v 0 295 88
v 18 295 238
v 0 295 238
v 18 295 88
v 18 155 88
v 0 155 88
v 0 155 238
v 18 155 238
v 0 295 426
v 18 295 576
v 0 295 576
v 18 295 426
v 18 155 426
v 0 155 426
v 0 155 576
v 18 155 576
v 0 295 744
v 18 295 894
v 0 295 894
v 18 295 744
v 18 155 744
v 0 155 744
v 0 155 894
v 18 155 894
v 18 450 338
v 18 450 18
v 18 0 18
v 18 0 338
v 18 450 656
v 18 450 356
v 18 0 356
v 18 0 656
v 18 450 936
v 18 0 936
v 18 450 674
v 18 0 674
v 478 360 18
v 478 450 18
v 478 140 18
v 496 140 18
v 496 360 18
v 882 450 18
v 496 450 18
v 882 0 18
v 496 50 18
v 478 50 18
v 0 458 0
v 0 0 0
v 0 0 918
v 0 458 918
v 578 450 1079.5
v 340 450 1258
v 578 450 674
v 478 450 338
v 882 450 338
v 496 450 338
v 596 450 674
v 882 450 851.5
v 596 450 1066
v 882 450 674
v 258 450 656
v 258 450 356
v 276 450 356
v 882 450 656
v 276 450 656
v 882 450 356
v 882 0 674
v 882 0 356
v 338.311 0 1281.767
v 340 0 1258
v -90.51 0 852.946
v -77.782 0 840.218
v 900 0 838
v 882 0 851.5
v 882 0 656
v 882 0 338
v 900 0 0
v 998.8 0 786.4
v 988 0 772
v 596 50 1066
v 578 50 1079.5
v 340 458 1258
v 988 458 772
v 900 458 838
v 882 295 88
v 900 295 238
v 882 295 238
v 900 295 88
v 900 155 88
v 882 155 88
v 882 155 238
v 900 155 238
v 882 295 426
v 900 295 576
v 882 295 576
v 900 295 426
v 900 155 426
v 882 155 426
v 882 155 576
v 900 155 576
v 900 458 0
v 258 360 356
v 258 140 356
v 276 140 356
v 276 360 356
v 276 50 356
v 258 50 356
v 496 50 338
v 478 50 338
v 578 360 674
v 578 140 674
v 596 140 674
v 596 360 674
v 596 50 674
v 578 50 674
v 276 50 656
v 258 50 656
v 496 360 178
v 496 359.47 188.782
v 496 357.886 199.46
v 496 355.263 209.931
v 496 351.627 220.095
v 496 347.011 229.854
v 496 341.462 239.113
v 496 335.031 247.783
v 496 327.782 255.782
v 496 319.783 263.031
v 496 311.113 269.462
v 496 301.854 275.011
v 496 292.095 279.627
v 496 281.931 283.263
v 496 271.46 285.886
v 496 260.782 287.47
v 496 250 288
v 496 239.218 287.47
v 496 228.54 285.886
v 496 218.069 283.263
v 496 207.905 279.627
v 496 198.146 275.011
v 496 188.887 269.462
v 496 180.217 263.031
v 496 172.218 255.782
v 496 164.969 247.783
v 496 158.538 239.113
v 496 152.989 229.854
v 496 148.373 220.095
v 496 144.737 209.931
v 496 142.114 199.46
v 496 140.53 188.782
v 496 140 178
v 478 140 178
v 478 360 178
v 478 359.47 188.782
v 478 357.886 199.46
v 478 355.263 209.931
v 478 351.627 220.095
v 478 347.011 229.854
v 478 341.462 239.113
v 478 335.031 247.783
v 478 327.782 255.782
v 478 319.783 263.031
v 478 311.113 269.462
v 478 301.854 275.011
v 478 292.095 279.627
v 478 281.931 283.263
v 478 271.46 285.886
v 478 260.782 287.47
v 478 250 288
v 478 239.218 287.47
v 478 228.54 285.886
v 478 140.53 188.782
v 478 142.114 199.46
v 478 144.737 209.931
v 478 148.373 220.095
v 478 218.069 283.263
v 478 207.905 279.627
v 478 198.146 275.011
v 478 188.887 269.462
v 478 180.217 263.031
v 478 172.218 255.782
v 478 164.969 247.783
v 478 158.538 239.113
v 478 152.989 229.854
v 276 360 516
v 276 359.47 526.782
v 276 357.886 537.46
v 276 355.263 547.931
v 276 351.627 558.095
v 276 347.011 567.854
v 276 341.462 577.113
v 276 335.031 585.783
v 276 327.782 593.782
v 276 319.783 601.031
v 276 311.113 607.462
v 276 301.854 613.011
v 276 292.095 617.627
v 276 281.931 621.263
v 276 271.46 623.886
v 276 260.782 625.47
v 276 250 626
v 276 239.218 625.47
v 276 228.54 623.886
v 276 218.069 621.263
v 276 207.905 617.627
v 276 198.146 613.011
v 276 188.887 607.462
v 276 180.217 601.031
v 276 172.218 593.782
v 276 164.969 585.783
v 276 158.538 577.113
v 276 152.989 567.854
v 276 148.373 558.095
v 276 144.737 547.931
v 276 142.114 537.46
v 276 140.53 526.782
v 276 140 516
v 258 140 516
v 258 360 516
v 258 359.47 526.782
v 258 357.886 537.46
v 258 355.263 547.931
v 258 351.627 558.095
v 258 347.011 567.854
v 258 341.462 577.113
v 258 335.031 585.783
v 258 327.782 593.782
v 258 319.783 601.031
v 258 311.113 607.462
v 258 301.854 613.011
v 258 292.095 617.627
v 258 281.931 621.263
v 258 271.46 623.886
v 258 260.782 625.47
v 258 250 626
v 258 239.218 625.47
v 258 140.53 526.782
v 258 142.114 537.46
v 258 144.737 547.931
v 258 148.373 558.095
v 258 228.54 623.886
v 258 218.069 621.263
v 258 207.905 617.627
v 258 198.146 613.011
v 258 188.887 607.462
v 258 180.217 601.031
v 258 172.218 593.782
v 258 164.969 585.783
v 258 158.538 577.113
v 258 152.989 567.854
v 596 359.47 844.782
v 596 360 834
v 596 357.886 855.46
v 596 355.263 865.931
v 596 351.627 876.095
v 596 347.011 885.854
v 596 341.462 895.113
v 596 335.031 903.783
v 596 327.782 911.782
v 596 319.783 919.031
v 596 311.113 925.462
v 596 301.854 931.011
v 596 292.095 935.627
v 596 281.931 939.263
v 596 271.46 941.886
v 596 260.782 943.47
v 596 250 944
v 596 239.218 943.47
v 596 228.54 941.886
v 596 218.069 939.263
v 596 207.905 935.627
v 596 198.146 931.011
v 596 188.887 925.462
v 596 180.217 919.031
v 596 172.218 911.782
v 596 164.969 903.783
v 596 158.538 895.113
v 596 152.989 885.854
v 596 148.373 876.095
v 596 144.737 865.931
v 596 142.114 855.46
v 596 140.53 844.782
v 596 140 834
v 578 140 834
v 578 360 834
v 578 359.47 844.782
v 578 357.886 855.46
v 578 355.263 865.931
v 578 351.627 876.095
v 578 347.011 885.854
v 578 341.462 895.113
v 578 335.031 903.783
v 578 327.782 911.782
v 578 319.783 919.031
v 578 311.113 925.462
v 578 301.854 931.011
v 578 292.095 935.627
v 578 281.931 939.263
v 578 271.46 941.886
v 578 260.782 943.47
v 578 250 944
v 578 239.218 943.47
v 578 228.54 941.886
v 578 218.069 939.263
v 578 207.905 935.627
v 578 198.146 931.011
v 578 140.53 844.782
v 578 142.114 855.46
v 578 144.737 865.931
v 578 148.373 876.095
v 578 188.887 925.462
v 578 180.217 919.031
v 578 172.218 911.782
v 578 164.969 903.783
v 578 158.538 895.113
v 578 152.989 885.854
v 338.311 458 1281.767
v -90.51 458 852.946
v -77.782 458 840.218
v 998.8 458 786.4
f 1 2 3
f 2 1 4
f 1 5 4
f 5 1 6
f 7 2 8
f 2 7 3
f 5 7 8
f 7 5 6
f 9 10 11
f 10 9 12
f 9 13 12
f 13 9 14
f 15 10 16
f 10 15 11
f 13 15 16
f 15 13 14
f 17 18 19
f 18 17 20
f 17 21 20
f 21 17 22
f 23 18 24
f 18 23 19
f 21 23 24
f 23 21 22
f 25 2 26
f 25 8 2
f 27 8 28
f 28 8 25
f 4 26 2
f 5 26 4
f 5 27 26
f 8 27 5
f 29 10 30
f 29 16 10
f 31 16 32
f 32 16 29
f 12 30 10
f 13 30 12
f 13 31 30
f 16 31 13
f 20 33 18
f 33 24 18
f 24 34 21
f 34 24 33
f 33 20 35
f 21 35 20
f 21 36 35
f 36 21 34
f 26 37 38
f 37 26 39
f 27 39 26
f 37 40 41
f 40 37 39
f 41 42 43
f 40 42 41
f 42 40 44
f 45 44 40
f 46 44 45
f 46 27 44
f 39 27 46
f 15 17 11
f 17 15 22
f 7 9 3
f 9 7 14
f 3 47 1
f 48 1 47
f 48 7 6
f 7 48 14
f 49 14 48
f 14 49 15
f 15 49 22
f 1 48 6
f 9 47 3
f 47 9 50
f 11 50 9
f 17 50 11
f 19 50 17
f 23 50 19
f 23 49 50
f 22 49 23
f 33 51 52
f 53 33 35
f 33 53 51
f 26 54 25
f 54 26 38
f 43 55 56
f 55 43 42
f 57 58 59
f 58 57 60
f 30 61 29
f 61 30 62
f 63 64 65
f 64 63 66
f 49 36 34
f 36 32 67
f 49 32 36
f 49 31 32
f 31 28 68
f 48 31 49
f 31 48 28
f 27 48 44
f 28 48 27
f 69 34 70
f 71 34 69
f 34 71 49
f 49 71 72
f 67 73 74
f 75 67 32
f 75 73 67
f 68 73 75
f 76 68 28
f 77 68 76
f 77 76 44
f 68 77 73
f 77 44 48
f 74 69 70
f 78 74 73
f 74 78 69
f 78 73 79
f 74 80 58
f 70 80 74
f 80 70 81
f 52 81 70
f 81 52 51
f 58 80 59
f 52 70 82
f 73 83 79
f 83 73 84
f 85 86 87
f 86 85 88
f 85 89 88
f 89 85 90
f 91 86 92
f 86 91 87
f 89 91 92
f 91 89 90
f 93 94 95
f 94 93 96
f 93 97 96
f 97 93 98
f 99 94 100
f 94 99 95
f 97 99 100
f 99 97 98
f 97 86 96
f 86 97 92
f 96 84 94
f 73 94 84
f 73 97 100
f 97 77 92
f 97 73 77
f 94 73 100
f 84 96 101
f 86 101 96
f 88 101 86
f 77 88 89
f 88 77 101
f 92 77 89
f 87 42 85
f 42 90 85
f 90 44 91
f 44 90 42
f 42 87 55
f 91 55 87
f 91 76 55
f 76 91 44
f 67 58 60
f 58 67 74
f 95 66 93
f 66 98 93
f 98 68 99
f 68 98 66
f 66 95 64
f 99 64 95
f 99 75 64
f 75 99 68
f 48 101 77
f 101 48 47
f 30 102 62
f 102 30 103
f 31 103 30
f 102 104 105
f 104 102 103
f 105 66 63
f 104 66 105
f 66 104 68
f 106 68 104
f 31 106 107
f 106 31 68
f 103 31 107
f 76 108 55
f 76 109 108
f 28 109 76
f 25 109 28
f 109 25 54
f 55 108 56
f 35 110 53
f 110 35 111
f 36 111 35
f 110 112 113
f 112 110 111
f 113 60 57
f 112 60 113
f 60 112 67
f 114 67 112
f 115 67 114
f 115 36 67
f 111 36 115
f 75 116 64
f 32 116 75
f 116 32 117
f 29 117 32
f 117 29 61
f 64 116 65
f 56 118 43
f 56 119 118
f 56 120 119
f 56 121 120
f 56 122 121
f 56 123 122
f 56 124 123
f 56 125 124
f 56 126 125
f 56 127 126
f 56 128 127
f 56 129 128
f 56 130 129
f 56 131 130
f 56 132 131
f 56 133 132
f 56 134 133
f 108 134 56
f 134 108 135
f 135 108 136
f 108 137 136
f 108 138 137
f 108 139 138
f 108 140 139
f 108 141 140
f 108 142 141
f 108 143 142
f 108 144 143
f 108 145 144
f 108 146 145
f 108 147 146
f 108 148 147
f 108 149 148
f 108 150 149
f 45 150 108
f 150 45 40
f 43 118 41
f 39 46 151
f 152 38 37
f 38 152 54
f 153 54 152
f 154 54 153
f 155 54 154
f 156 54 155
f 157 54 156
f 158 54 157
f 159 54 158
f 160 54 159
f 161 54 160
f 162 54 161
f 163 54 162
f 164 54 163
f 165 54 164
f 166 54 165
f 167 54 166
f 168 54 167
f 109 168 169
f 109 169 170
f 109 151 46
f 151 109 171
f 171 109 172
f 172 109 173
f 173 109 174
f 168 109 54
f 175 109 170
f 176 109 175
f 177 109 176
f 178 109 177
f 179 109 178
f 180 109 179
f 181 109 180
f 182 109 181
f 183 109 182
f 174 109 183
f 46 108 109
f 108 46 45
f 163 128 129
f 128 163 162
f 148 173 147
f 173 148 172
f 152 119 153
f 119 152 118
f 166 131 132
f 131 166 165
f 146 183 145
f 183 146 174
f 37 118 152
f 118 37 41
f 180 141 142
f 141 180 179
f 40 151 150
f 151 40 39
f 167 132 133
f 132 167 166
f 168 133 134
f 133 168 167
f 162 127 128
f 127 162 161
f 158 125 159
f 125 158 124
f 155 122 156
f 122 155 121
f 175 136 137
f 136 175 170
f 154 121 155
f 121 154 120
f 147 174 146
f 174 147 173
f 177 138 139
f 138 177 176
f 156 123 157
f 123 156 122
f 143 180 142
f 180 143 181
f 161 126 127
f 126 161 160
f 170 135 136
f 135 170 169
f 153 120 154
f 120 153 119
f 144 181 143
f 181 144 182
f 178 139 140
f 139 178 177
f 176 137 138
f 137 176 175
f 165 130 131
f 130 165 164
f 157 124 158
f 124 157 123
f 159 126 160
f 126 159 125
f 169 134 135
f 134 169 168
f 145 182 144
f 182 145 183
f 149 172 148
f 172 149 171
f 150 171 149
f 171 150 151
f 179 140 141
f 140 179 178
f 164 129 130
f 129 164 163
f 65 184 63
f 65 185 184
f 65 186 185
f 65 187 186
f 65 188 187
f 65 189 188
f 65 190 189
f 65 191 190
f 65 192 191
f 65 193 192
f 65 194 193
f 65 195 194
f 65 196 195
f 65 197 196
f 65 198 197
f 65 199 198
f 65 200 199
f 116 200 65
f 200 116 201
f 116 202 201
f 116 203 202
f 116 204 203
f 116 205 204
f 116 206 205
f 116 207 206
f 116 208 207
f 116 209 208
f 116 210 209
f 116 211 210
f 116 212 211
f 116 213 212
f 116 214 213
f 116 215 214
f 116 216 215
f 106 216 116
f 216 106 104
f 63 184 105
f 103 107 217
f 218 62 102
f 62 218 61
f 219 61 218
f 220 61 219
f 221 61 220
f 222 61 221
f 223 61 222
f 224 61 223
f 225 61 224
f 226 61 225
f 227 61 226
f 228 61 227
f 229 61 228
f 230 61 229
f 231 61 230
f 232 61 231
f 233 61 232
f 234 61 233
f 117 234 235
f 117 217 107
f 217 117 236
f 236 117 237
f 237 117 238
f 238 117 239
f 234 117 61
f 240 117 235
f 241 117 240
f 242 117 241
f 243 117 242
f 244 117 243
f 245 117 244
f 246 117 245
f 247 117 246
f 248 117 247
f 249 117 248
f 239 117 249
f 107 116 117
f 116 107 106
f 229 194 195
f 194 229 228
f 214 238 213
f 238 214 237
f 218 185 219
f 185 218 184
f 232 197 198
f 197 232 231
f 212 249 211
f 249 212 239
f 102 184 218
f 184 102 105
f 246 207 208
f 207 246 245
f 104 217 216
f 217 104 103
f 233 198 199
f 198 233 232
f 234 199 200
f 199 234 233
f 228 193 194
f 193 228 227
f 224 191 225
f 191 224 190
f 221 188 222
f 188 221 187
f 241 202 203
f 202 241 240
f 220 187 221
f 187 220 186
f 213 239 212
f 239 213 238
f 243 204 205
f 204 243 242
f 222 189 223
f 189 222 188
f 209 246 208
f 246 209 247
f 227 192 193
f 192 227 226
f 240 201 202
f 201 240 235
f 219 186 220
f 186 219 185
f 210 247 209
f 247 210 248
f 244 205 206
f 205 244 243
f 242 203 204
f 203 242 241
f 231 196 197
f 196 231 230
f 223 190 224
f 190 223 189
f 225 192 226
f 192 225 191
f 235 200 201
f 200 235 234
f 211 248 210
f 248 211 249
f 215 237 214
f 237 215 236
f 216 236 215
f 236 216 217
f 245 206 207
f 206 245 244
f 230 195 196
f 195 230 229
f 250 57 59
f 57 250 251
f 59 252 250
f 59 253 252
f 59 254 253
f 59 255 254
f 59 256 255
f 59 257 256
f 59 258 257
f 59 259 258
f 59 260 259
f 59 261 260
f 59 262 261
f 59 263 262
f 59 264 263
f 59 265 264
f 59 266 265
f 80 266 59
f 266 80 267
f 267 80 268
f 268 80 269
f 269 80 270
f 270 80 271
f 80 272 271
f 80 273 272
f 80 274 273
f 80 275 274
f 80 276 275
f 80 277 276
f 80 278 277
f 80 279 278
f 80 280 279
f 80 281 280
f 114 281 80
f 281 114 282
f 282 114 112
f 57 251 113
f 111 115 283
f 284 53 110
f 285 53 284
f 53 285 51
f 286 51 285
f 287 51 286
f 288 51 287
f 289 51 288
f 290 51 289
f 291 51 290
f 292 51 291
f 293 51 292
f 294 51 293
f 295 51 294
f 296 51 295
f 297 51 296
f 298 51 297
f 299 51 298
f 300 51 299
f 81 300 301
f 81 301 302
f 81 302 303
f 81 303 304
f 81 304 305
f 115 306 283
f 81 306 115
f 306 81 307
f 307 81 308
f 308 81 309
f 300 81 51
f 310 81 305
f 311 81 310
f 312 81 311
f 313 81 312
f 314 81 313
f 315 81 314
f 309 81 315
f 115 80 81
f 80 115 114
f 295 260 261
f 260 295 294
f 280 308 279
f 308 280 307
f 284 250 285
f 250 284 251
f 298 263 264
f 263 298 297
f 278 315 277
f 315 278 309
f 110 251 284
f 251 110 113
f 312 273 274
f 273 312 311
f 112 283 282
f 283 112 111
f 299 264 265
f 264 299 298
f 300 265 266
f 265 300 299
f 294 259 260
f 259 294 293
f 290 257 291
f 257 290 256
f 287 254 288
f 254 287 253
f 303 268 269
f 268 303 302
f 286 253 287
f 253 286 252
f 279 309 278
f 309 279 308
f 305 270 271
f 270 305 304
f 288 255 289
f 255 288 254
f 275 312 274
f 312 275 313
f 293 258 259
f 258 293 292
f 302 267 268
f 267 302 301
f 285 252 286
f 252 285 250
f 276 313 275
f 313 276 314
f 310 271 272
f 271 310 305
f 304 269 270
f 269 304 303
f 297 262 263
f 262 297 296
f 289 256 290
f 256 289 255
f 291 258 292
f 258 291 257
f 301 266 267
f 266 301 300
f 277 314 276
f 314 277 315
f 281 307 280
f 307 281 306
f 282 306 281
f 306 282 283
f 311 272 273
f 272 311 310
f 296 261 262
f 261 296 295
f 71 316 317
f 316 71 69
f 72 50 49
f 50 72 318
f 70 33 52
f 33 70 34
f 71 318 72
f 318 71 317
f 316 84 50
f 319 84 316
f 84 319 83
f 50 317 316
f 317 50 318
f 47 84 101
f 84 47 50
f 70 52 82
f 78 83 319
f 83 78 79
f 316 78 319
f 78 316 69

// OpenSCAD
// A dollhouse at 1:12, the same editing loop as bracket.scad and three orders
// of magnitude bigger: a metre of house in millimetres, cut from sheet stock.
//
// It is here for the size. A bracket fits in the preview whatever you do to it;
// this one has to be framed, and every number is load-bearing — move the ridge
// and two roof panels, a mitre and an attic wall all follow.
//
// Sheet goods, so the model is built the way it would be cut:
//   - carcass of 18 mm birch ply
//   - 8 mm back panel, screwed on behind, no groove to rout
//   - roof mitred at the ridge, flush over the back panel
//   - windows in the side walls, arched doorways in the partitions
//
// X = width, Y = depth, Z = height. Origin at the front left corner of the
// base. Everything in millimetres.

/* [Stock] */
t          = 18;        // carcass ply
back_t     = 8;         // back panel

/* [Outside] */
W          = 900;       // outside width
D          = 450;       // carcass depth, back panel not counted
wall_l_h   = 900;       // left side wall, above the base
wall_r_h   = 820;       // right side wall — deliberately the shorter one

/* [Storeys] */
h_ground   = 320;       // clear height, ground floor
h_first    = 300;       // clear height, first floor

/* [Roof] */
// The ridge is not a given number: pick where it sits and how steep the left
// side is, and the right pitch is whatever reaches the lower wall.
ridge_x    = 340;       // ridge position, measured from the left
pitch_l    = 45;        // pitch of the left roof, degrees
overhang   = 110;       // eaves overhang, measured along the slope
back_over  = 0;         // extra roof behind the back panel

/* [Partitions] */
div_depth  = 400;       // depth of the upright partitions
room_g_l   = 460;       // clear room width, ground floor left
room_f_l   = 240;       // clear room width, first floor left
room_a_l   = 560;       // clear room width, attic left

/* [Doorways] */
arch_w     = 220;       // width, in Y
arch_h     = 270;       // total height including the round top

/* [Windows] */
win_w      = 140;       // width, in Y — across the depth of the house
win_h      = 150;       // height
win_sill   = 70;        // sill above the floor it stands on
win_arched = false;     // true = round top, to match the doorways
win_ground = true;
win_first  = true;
win_attic  = true;      // left always; right only if that wall is tall enough

/* [View] */
explode    = 0;         // 0 = assembled, 150 = exploded
show_back  = true;
show_roof  = true;

$fn = 64;

// =====================================================================
// Derived
// =====================================================================

w_in   = W - 2*t;           // clear inside width
x_in   = t;                 // inside face of the left wall

z_base   = 0;               // base, full width
z_ground = t;               // top of the base = ground floor
z_d2     = z_ground + h_ground;
z_first  = z_d2 + t;
z_d3     = z_first + h_first;
z_attic  = z_d3 + t;

top_l  = t + wall_l_h;      // top edge of the left wall
top_r  = t + wall_r_h;      // top edge of the right wall

roof_depth = D + back_t + back_over;   // the roof covers the back panel too

// --- Pitches. The left one is given; the right one falls out of it. ---
ridge_z = top_l + ridge_x * tan(pitch_l);

dx_l    = ridge_x;
dz_l    = ridge_z - top_l;
len_l   = sqrt(dx_l*dx_l + dz_l*dz_l);

dx_r    = W - ridge_x;
dz_r    = ridge_z - top_r;
pitch_r = atan2(dz_r, dx_r);
len_r   = sqrt(dx_r*dx_r + dz_r*dz_r);

panel_l = len_l + overhang;   // small panel, left, on the underside
panel_r = len_r + overhang;   // large panel, right

angle_ridge   = 180 - pitch_l - pitch_r;
angle_eaves_l = 90 + pitch_l;
angle_eaves_r = 90 + pitch_r;

// --- Mitre plane at the ridge: the bisector of the two roof planes ---
bx_  = cos(pitch_r) - cos(pitch_l);
bz_  = -(sin(pitch_l) + sin(pitch_r));
bl_  = sqrt(bx_*bx_ + bz_*bz_);
bxn  = bx_ / bl_;
bzn  = bz_ / bl_;
mitre = atan2(-bxn, -bzn);          // tilt of the mitre plane off vertical
blade = 90 - angle_ridge/2;         // blade tilt to set on the saw

// Normal of the mitre plane, pointing towards +x
nx_ = -bzn;
nz_ =  bxn;

// Where a line crosses the mitre plane, parameter s from (ex, ez)
function s_ridge(ex, ez, dx, dz) =
    ((ridge_x - ex)*nx_ + (ridge_z - ez)*nz_) / (dx*nx_ + dz*nz_);

// Eaves corners of the undersides
ex_l = ridge_x - cos(pitch_l)*panel_l;
ez_l = ridge_z - sin(pitch_l)*panel_l;
ex_r = ridge_x + cos(pitch_r)*panel_r;
ez_r = ridge_z - sin(pitch_r)*panel_r;

// Cut length = the longer of the two edges once the mitre is taken off
sl_low = s_ridge(ex_l, ez_l, cos(pitch_l), sin(pitch_l));
sl_up  = s_ridge(ex_l - t*sin(pitch_l), ez_l + t*cos(pitch_l), cos(pitch_l), sin(pitch_l));
sr_low = s_ridge(ex_r, ez_r, -cos(pitch_r), sin(pitch_r));
sr_up  = s_ridge(ex_r + t*sin(pitch_r), ez_r + t*cos(pitch_r), -cos(pitch_r), sin(pitch_r));

cut_l = max(sl_low, sl_up);
cut_r = max(sr_low, sr_up);

// Outside height over the ridge
ridge_outside = ridge_z + t / cos((pitch_l + pitch_r)/2);

// Room widths on the other side of each partition
room_g_r = w_in - room_g_l - t;
room_f_r = w_in - room_f_l - t;
room_a_r = w_in - room_a_l - t;

x_div_a = x_in + room_a_l;

// Underside of the roof at x
function roof_z(x) = (x <= ridge_x)
    ? top_l + x * tan(pitch_l)
    : top_r + (W - x) * tan(pitch_r);

div_h_a   = roof_z(x_div_a) - z_attic;
div_h_a_r = roof_z(x_div_a + t) - z_attic;   // other face, the roof has moved

win_top = win_sill + win_h;

// Does a window still fit under the low right wall in the attic?
// (20 mm of material over the head is the least worth cutting.)
attic_r_fits = (z_attic + win_top) <= (top_r - 20);

// =====================================================================
// Parts
// =====================================================================

module base_floor()  cube([W, D, t]);
module inner_floor() cube([w_in, D, t]);

// Everything above the two roof planes — used to take the tops off walls
module above_roof() {
    translate([ridge_x, -10, ridge_z]) {
        rotate([0, -pitch_l, 0]) translate([-3000, 0, 0]) cube([3000, roof_depth + 20, 3000]);
        rotate([0,  pitch_r, 0])                          cube([3000, roof_depth + 20, 3000]);
    }
}

// A window, cut through the full thickness of a side wall
module window_cut(z_floor) {
    r  = win_w / 2;
    y0 = (D - win_w) / 2;
    z0 = z_floor + win_sill;
    translate([t + 1, y0, z0])
        rotate([0, -90, 0])
            linear_extrude(t + 2)
                if (win_arched)
                    union() {
                        square([win_h - r, win_w]);
                        translate([win_h - r, r]) circle(r);
                    }
                else
                    square([win_h, win_w]);
}

module side_wall(x, is_left) {
    difference() {
        translate([x, 0, t]) cube([t, D, ridge_z - t]);
        above_roof();
        translate([x, 0, 0]) {
            if (win_ground) window_cut(z_ground);
            if (win_first)  window_cut(z_first);
            if (win_attic && (is_left || attic_r_fits)) window_cut(z_attic);
        }
    }
}

// The doorway, as a negative
module archway(z0) {
    r  = arch_w / 2;
    y0 = (D - div_depth) + (div_depth - arch_w) / 2;
    translate([t + 1, y0, z0])
        rotate([0, -90, 0])
            linear_extrude(t + 2)
                union() {
                    square([arch_h - r, arch_w]);
                    translate([arch_h - r, r]) circle(r);
                }
}

// to_roof = true: the top is taken off by the roof, as in the attic.
// Otherwise the part stops dead under the floor above.
module divider(x, z0, h, arched = true, to_roof = false) {
    difference() {
        translate([x, D - div_depth, z0])
            cube([t, div_depth, to_roof ? h + 60 : h]);
        if (arched)  translate([x, 0, 0]) archway(z0);
        if (to_roof) above_roof();
    }
}

// The two half-spaces either side of the mitre plane
module past_ridge_right() {
    translate([ridge_x, -10, ridge_z]) rotate([0, mitre, 0])
        translate([0, 0, -3000]) cube([3000, roof_depth + 20, 6000]);
}
module past_ridge_left() {
    translate([ridge_x, -10, ridge_z]) rotate([0, mitre, 0])
        translate([-3000, 0, -3000]) cube([3000, roof_depth + 20, 6000]);
}

module roof_left() {
    difference() {
        translate([ridge_x, 0, ridge_z]) rotate([0, -pitch_l, 0])
            translate([-panel_l, 0, 0]) cube([panel_l + 60, roof_depth, t]);
        past_ridge_right();
    }
}

module roof_right() {
    difference() {
        translate([ridge_x, 0, ridge_z]) rotate([0, pitch_r, 0])
            translate([-60, 0, 0]) cube([panel_r + 60, roof_depth, t]);
        past_ridge_left();
    }
}

module back_panel() {
    translate([0, D + back_t, 0]) rotate([90, 0, 0])
        linear_extrude(back_t)
            polygon([[0, 0], [W, 0], [W, top_r], [ridge_x, ridge_z], [0, top_l]]);
}

// =====================================================================
// Assembly
// =====================================================================

module dollhouse() {
    color("BurlyWood") {
        translate([0, 0, z_base])              base_floor();
        translate([x_in, 0, z_d2 + explode])   inner_floor();
        translate([x_in, 0, z_d3 + 2*explode]) inner_floor();

        translate([-explode, 0, 0]) side_wall(0,     true);
        translate([ explode, 0, 0]) side_wall(W - t, false);
    }

    color("Tan") {
        divider(x_in + room_g_l, z_ground, h_ground);
        translate([0, 0, explode])   divider(x_in + room_f_l, z_first, h_first);
        translate([0, 0, 2*explode]) divider(x_div_a, z_attic, div_h_a, true, true);
    }

    if (show_roof)
        color("Sienna") translate([0, 0, 3*explode]) {
            roof_left();
            roof_right();
        }

    if (show_back)
        color("Peru", 0.85) translate([0, explode, 0]) back_panel();
}

dollhouse();

// =====================================================================
// Cut list, in the console
// =====================================================================

echo();
echo("=============== DOLLHOUSE — CUT LIST ===============");
echo(str("stock, carcass / back    : ", t, " / ", back_t, " mm"));
echo(str("outside, W x D           : ", W, " x ", D + back_t, " mm"));
echo(str("ridge, inside / outside  : ", ridge_z, " / ", ridge_outside, " mm"));
echo(str("clear inside width       : ", w_in, " mm"));
echo();
echo("--- floors ---");
echo(str("base, full width         : ", W, " x ", D, " mm"));
echo(str("two inner floors         : ", w_in, " x ", D, " mm  <-- not the full ", W));
echo();
echo("--- side walls ---");
echo(str("left                     : ", wall_l_h, " x ", D, " mm, top at z = ", top_l));
echo(str("right                    : ", wall_r_h, " x ", D, " mm, top at z = ", top_r));
echo();
echo(str("--- partitions, ", div_depth, " mm deep ---"));
echo(str("ground : ", h_ground, " mm  at x = ", x_in + room_g_l));
echo(str("first  : ", h_first,  " mm  at x = ", x_in + room_f_l));
echo(str("attic  : ", div_h_a, " mm left / ", div_h_a_r, " mm right, at x = ", x_div_a));
echo();
echo("--- rooms, clear widths ---");
echo(str("ground : ", room_g_l, " + ", t, " + ", room_g_r, " = ", room_g_l + t + room_g_r));
echo(str("first  : ", room_f_l, " + ", t, " + ", room_f_r, " = ", room_f_l + t + room_f_r));
echo(str("attic  : ", room_a_l, " + ", t, " + ", room_a_r, " = ", room_a_l + t + room_a_r));
echo();
echo("--- roof ---");
echo(str("small panel, left        : ", cut_l, " x ", roof_depth, " mm"));
echo(str("large panel, right       : ", cut_r, " x ", roof_depth, " mm"));
echo(str("pitch, left / right      : ", pitch_l, " / ", pitch_r, " deg"));
echo(str("ridge angle              : ", angle_ridge, " deg"));
echo(str("mitre, each panel        : ", blade, " deg of blade tilt"));
echo(str("eaves, left / right      : ", angle_eaves_l, " / ", angle_eaves_r, " deg"));
echo(str("overhang                 : ", overhang, " mm along the slope"));
echo();
echo("--- windows ---");
echo(str("size                     : ", win_w, " x ", win_h, " mm",
         win_arched ? ", round top" : ", square"));
echo(str("in Y                     : ", (D - win_w)/2, " .. ", (D + win_w)/2,
         " mm from the front"));
echo(str("sill                     : ", win_sill, " mm over the floor"));
echo(str("how many                 : ", (win_ground ? 2 : 0) + (win_first ? 2 : 0)
                                      + (win_attic ? (attic_r_fits ? 2 : 1) : 0)));
echo();
echo("--- heights ---");
echo(str("ground  ", z_ground, " .. ", z_d2, "  = ", h_ground, " mm"));
echo(str("first   ", z_first,  " .. ", z_d3, "  = ", h_first,  " mm"));
echo(str("attic   from ", z_attic, ", clear at the left wall ", top_l - z_attic,
         ", right ", top_r - z_attic));
echo();
echo("--- does it hold together ---");
if (ridge_z <= top_r)
    echo("ERROR: the ridge is not above the right wall — lower pitch_l or move ridge_x");
if (ridge_x <= t || ridge_x >= W - t)
    echo("ERROR: the ridge is outside the walls");
if (room_g_l + t + room_g_r != w_in) echo("ERROR: ground floor rooms do not fit the width");
if (room_f_l + t + room_f_r != w_in) echo("ERROR: first floor rooms do not fit the width");
if (room_a_l + t + room_a_r != w_in) echo("ERROR: attic rooms do not fit the width");
if (h_ground < arch_h + 20) echo(str("WARNING: only ", h_ground - arch_h, " mm over the ground floor doorway"));
if (h_first  < arch_h + 20) echo(str("WARNING: only ", h_first  - arch_h, " mm over the first floor doorway"));
if (div_depth > D) echo("ERROR: the partitions are deeper than the carcass");
if (arch_w > div_depth - 40) echo("WARNING: little material beside the doorway");
if (win_w > D - 60) echo("WARNING: wide window, not much edge front or back");
if (win_ground && z_ground + win_top > z_d2) echo("ERROR: the ground floor window runs into the floor above");
if (win_first  && z_first  + win_top > z_d3) echo("ERROR: the first floor window runs into the floor above");
if (win_attic  && z_attic  + win_top > top_l) echo("ERROR: the attic window runs over the left wall");
if (win_attic && !attic_r_fits)
    echo(str("NOTE: no attic window on the right — that wall ends ", top_r - z_attic,
             " mm over the floor and the window needs ", win_top));
echo("====================================================");
